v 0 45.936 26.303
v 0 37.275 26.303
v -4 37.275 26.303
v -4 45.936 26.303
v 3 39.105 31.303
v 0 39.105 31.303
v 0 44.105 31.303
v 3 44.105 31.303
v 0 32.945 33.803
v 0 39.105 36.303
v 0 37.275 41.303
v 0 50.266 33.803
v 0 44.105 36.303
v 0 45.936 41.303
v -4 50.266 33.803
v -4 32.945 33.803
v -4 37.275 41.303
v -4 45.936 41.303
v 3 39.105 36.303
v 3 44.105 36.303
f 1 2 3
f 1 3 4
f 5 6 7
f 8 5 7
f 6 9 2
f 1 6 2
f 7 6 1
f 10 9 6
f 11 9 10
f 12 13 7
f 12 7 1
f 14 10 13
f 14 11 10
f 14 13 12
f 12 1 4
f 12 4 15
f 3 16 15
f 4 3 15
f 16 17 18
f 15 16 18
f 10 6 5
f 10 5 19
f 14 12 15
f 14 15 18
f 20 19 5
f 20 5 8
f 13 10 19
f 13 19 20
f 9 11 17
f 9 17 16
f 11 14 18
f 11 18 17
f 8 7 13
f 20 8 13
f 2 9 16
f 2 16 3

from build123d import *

# Parameters (mm, degrees)
F0_W     = 5
F0_H     = 5
F1_DEPTH = 3
F2_DEPTH = 4


with BuildPart() as f1:
    # F0 (on Right) → F1 (new body)
    with BuildSketch(Plane.YZ):
        with Locations((41.605493, 33.802644)):
            Rectangle(F0_W, F0_H)
    extrude(amount=F1_DEPTH)

    # F0 (on Right) → F2 (join)
    with BuildSketch(Plane.YZ):
        Polygon((45.93562, 41.302644), (37.275366, 41.302644), (32.945239, 33.802644), (37.275366, 26.302644), (45.93562, 26.302644), (50.265747, 33.802644), align=None)
        with Locations((41.605493, 33.802644)):
            Rectangle(F0_W, F0_H, mode=Mode.SUBTRACT)
        with Locations((41.605493, 33.802644)):
            Rectangle(F0_W, F0_H)
    extrude(amount=-F2_DEPTH)


solid = f1.part
